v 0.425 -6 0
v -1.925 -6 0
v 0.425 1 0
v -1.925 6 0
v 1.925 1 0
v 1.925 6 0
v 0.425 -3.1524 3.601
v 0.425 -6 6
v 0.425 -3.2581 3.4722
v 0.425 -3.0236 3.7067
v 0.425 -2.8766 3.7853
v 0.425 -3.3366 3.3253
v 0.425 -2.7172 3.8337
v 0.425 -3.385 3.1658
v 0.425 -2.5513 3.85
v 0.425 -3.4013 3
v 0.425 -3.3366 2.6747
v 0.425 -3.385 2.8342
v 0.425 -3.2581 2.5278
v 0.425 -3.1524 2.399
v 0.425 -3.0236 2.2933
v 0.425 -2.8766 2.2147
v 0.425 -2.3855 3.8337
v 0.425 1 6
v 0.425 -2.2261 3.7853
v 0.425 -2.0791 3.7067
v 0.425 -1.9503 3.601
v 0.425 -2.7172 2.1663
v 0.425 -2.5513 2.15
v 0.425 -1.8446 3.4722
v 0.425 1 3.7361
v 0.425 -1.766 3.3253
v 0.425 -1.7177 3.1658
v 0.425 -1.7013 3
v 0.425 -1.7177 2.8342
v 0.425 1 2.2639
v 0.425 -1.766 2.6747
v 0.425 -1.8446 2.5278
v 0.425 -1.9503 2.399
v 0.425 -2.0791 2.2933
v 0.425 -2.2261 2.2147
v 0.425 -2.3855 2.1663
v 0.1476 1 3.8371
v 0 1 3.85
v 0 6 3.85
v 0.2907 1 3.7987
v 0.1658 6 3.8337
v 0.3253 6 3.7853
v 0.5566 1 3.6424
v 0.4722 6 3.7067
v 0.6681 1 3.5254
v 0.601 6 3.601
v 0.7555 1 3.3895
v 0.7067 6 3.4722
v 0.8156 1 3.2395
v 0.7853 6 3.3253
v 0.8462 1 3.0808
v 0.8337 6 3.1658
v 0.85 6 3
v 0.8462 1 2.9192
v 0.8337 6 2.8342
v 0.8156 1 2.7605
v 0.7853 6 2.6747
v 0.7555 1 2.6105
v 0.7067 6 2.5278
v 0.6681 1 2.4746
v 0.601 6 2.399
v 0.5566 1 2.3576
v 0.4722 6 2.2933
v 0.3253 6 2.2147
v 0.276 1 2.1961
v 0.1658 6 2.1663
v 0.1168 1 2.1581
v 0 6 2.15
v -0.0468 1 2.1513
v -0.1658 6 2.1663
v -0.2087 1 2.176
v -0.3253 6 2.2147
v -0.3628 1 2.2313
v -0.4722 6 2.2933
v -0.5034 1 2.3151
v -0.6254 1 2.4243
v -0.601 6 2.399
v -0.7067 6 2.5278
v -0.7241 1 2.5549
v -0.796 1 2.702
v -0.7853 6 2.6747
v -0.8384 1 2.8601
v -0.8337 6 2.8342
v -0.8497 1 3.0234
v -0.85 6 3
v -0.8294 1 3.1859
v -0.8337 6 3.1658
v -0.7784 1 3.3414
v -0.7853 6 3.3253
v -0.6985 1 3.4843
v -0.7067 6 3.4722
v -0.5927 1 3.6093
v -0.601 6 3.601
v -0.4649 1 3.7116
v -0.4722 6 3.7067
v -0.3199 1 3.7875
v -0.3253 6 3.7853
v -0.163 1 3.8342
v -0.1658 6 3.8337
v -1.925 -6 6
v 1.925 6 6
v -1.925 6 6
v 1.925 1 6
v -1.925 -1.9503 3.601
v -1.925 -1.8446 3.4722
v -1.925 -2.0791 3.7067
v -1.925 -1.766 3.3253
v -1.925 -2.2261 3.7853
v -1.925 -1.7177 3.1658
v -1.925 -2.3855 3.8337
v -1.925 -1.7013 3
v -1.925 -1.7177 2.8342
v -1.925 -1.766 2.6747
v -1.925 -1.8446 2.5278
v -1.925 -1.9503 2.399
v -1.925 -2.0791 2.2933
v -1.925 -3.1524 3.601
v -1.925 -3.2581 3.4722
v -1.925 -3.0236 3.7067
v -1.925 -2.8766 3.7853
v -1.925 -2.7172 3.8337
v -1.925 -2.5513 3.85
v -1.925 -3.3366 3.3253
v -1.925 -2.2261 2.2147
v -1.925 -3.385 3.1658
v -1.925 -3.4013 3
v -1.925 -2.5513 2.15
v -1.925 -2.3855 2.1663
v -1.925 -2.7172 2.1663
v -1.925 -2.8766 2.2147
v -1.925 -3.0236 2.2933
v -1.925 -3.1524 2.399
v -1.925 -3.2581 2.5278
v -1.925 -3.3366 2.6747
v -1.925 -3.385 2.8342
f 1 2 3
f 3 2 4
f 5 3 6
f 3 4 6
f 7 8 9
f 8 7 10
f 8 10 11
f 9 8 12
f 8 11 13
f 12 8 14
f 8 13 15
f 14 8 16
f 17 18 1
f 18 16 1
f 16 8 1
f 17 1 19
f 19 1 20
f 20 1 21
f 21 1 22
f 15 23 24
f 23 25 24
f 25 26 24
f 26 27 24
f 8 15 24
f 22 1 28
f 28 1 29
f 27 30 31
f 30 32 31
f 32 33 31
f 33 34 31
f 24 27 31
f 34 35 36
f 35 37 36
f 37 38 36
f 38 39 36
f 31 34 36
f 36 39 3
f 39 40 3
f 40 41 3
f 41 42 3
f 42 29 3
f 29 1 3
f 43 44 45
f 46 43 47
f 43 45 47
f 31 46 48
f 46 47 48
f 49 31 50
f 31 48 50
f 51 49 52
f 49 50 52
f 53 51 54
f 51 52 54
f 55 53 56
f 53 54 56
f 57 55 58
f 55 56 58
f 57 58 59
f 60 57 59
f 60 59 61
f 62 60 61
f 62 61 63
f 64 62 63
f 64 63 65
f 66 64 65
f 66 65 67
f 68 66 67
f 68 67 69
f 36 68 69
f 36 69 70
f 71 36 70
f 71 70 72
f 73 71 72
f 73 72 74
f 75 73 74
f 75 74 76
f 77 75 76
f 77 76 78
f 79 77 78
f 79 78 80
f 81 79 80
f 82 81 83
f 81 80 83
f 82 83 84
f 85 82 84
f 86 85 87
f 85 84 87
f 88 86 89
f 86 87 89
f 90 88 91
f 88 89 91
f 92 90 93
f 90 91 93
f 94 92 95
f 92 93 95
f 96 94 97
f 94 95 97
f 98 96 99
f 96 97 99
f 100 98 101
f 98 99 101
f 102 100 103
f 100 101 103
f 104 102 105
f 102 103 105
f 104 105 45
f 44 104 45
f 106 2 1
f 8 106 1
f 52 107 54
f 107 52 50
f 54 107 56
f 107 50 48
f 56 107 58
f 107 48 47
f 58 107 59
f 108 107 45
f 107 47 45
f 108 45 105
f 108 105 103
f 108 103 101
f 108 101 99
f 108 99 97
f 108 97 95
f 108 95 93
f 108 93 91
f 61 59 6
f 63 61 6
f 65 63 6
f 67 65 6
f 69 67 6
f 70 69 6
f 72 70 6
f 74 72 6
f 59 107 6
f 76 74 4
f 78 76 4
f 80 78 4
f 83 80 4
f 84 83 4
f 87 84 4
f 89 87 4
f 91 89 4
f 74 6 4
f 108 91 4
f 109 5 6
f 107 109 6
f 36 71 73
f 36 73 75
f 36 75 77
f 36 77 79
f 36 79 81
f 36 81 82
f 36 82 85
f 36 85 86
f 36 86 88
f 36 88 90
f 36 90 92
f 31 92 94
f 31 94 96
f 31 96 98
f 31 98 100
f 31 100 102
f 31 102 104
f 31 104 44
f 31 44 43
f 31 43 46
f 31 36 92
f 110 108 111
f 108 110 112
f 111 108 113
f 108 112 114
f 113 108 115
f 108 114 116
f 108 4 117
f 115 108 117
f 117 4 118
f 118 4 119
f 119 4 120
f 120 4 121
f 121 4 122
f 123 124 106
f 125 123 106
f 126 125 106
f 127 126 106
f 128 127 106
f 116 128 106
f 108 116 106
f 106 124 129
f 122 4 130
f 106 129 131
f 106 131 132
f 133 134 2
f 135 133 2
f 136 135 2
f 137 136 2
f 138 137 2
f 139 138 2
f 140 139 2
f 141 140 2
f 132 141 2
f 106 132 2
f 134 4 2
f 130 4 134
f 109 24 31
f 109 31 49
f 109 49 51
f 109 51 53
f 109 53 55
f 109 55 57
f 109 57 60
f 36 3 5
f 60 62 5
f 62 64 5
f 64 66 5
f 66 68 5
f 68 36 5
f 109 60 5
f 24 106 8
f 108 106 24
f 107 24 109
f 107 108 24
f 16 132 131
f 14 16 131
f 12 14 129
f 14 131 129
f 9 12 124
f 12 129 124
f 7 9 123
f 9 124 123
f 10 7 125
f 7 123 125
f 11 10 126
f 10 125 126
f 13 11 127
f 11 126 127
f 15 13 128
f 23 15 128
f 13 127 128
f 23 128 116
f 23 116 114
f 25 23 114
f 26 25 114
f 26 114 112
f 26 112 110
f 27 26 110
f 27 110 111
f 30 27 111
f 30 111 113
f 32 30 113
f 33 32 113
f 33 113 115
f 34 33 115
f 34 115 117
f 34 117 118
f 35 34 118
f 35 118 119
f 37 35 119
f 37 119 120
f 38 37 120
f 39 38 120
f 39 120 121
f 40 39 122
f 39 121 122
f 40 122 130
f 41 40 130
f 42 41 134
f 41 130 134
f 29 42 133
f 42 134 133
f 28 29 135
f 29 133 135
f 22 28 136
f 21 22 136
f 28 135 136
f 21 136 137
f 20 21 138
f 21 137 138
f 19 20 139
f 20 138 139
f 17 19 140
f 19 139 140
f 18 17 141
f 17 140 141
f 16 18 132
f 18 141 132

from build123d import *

# Parameters (mm, degrees)
BOSS_EXTRUDE1_DEPTH = 6
SKETCH2_R           = 0.85
CUT_EXTRUDE1_DEPTH  = 10.317859196
SKETCH3_R           = 0.85
CUT_EXTRUDE2_DEPTH  = 5


with BuildPart() as part:
    # Sketch1 → Boss-Extrude1 (new body)
    with BuildSketch(Plane.XY):
        Polygon((-1.925, -6), (0.425, -6), (0.425, 1), (1.925, 1), (1.925, 6), (-1.925, 6), align=None)
    extrude(amount=BOSS_EXTRUDE1_DEPTH)

    # Sketch2 → Cut-Extrude1 (cut, through all)
    with BuildSketch(Plane.ZY.offset(1.925)):
        with Locations(Location((3, -2.55134747, 0), (0, 0, 270))):
            Circle(SKETCH2_R)
    extrude(amount=-CUT_EXTRUDE1_DEPTH, mode=Mode.SUBTRACT)

    # Sketch3 → Cut-Extrude2 (cut)
    with BuildSketch(Plane(origin=(0, 6, 0), x_dir=(1, 0, 0), z_dir=(0, 1, 0))):
        with Locations(Location((0, -3, 0), (0, 0, 270))):
            Circle(SKETCH3_R)
    extrude(amount=-CUT_EXTRUDE2_DEPTH, mode=Mode.SUBTRACT)


solid = part.part
